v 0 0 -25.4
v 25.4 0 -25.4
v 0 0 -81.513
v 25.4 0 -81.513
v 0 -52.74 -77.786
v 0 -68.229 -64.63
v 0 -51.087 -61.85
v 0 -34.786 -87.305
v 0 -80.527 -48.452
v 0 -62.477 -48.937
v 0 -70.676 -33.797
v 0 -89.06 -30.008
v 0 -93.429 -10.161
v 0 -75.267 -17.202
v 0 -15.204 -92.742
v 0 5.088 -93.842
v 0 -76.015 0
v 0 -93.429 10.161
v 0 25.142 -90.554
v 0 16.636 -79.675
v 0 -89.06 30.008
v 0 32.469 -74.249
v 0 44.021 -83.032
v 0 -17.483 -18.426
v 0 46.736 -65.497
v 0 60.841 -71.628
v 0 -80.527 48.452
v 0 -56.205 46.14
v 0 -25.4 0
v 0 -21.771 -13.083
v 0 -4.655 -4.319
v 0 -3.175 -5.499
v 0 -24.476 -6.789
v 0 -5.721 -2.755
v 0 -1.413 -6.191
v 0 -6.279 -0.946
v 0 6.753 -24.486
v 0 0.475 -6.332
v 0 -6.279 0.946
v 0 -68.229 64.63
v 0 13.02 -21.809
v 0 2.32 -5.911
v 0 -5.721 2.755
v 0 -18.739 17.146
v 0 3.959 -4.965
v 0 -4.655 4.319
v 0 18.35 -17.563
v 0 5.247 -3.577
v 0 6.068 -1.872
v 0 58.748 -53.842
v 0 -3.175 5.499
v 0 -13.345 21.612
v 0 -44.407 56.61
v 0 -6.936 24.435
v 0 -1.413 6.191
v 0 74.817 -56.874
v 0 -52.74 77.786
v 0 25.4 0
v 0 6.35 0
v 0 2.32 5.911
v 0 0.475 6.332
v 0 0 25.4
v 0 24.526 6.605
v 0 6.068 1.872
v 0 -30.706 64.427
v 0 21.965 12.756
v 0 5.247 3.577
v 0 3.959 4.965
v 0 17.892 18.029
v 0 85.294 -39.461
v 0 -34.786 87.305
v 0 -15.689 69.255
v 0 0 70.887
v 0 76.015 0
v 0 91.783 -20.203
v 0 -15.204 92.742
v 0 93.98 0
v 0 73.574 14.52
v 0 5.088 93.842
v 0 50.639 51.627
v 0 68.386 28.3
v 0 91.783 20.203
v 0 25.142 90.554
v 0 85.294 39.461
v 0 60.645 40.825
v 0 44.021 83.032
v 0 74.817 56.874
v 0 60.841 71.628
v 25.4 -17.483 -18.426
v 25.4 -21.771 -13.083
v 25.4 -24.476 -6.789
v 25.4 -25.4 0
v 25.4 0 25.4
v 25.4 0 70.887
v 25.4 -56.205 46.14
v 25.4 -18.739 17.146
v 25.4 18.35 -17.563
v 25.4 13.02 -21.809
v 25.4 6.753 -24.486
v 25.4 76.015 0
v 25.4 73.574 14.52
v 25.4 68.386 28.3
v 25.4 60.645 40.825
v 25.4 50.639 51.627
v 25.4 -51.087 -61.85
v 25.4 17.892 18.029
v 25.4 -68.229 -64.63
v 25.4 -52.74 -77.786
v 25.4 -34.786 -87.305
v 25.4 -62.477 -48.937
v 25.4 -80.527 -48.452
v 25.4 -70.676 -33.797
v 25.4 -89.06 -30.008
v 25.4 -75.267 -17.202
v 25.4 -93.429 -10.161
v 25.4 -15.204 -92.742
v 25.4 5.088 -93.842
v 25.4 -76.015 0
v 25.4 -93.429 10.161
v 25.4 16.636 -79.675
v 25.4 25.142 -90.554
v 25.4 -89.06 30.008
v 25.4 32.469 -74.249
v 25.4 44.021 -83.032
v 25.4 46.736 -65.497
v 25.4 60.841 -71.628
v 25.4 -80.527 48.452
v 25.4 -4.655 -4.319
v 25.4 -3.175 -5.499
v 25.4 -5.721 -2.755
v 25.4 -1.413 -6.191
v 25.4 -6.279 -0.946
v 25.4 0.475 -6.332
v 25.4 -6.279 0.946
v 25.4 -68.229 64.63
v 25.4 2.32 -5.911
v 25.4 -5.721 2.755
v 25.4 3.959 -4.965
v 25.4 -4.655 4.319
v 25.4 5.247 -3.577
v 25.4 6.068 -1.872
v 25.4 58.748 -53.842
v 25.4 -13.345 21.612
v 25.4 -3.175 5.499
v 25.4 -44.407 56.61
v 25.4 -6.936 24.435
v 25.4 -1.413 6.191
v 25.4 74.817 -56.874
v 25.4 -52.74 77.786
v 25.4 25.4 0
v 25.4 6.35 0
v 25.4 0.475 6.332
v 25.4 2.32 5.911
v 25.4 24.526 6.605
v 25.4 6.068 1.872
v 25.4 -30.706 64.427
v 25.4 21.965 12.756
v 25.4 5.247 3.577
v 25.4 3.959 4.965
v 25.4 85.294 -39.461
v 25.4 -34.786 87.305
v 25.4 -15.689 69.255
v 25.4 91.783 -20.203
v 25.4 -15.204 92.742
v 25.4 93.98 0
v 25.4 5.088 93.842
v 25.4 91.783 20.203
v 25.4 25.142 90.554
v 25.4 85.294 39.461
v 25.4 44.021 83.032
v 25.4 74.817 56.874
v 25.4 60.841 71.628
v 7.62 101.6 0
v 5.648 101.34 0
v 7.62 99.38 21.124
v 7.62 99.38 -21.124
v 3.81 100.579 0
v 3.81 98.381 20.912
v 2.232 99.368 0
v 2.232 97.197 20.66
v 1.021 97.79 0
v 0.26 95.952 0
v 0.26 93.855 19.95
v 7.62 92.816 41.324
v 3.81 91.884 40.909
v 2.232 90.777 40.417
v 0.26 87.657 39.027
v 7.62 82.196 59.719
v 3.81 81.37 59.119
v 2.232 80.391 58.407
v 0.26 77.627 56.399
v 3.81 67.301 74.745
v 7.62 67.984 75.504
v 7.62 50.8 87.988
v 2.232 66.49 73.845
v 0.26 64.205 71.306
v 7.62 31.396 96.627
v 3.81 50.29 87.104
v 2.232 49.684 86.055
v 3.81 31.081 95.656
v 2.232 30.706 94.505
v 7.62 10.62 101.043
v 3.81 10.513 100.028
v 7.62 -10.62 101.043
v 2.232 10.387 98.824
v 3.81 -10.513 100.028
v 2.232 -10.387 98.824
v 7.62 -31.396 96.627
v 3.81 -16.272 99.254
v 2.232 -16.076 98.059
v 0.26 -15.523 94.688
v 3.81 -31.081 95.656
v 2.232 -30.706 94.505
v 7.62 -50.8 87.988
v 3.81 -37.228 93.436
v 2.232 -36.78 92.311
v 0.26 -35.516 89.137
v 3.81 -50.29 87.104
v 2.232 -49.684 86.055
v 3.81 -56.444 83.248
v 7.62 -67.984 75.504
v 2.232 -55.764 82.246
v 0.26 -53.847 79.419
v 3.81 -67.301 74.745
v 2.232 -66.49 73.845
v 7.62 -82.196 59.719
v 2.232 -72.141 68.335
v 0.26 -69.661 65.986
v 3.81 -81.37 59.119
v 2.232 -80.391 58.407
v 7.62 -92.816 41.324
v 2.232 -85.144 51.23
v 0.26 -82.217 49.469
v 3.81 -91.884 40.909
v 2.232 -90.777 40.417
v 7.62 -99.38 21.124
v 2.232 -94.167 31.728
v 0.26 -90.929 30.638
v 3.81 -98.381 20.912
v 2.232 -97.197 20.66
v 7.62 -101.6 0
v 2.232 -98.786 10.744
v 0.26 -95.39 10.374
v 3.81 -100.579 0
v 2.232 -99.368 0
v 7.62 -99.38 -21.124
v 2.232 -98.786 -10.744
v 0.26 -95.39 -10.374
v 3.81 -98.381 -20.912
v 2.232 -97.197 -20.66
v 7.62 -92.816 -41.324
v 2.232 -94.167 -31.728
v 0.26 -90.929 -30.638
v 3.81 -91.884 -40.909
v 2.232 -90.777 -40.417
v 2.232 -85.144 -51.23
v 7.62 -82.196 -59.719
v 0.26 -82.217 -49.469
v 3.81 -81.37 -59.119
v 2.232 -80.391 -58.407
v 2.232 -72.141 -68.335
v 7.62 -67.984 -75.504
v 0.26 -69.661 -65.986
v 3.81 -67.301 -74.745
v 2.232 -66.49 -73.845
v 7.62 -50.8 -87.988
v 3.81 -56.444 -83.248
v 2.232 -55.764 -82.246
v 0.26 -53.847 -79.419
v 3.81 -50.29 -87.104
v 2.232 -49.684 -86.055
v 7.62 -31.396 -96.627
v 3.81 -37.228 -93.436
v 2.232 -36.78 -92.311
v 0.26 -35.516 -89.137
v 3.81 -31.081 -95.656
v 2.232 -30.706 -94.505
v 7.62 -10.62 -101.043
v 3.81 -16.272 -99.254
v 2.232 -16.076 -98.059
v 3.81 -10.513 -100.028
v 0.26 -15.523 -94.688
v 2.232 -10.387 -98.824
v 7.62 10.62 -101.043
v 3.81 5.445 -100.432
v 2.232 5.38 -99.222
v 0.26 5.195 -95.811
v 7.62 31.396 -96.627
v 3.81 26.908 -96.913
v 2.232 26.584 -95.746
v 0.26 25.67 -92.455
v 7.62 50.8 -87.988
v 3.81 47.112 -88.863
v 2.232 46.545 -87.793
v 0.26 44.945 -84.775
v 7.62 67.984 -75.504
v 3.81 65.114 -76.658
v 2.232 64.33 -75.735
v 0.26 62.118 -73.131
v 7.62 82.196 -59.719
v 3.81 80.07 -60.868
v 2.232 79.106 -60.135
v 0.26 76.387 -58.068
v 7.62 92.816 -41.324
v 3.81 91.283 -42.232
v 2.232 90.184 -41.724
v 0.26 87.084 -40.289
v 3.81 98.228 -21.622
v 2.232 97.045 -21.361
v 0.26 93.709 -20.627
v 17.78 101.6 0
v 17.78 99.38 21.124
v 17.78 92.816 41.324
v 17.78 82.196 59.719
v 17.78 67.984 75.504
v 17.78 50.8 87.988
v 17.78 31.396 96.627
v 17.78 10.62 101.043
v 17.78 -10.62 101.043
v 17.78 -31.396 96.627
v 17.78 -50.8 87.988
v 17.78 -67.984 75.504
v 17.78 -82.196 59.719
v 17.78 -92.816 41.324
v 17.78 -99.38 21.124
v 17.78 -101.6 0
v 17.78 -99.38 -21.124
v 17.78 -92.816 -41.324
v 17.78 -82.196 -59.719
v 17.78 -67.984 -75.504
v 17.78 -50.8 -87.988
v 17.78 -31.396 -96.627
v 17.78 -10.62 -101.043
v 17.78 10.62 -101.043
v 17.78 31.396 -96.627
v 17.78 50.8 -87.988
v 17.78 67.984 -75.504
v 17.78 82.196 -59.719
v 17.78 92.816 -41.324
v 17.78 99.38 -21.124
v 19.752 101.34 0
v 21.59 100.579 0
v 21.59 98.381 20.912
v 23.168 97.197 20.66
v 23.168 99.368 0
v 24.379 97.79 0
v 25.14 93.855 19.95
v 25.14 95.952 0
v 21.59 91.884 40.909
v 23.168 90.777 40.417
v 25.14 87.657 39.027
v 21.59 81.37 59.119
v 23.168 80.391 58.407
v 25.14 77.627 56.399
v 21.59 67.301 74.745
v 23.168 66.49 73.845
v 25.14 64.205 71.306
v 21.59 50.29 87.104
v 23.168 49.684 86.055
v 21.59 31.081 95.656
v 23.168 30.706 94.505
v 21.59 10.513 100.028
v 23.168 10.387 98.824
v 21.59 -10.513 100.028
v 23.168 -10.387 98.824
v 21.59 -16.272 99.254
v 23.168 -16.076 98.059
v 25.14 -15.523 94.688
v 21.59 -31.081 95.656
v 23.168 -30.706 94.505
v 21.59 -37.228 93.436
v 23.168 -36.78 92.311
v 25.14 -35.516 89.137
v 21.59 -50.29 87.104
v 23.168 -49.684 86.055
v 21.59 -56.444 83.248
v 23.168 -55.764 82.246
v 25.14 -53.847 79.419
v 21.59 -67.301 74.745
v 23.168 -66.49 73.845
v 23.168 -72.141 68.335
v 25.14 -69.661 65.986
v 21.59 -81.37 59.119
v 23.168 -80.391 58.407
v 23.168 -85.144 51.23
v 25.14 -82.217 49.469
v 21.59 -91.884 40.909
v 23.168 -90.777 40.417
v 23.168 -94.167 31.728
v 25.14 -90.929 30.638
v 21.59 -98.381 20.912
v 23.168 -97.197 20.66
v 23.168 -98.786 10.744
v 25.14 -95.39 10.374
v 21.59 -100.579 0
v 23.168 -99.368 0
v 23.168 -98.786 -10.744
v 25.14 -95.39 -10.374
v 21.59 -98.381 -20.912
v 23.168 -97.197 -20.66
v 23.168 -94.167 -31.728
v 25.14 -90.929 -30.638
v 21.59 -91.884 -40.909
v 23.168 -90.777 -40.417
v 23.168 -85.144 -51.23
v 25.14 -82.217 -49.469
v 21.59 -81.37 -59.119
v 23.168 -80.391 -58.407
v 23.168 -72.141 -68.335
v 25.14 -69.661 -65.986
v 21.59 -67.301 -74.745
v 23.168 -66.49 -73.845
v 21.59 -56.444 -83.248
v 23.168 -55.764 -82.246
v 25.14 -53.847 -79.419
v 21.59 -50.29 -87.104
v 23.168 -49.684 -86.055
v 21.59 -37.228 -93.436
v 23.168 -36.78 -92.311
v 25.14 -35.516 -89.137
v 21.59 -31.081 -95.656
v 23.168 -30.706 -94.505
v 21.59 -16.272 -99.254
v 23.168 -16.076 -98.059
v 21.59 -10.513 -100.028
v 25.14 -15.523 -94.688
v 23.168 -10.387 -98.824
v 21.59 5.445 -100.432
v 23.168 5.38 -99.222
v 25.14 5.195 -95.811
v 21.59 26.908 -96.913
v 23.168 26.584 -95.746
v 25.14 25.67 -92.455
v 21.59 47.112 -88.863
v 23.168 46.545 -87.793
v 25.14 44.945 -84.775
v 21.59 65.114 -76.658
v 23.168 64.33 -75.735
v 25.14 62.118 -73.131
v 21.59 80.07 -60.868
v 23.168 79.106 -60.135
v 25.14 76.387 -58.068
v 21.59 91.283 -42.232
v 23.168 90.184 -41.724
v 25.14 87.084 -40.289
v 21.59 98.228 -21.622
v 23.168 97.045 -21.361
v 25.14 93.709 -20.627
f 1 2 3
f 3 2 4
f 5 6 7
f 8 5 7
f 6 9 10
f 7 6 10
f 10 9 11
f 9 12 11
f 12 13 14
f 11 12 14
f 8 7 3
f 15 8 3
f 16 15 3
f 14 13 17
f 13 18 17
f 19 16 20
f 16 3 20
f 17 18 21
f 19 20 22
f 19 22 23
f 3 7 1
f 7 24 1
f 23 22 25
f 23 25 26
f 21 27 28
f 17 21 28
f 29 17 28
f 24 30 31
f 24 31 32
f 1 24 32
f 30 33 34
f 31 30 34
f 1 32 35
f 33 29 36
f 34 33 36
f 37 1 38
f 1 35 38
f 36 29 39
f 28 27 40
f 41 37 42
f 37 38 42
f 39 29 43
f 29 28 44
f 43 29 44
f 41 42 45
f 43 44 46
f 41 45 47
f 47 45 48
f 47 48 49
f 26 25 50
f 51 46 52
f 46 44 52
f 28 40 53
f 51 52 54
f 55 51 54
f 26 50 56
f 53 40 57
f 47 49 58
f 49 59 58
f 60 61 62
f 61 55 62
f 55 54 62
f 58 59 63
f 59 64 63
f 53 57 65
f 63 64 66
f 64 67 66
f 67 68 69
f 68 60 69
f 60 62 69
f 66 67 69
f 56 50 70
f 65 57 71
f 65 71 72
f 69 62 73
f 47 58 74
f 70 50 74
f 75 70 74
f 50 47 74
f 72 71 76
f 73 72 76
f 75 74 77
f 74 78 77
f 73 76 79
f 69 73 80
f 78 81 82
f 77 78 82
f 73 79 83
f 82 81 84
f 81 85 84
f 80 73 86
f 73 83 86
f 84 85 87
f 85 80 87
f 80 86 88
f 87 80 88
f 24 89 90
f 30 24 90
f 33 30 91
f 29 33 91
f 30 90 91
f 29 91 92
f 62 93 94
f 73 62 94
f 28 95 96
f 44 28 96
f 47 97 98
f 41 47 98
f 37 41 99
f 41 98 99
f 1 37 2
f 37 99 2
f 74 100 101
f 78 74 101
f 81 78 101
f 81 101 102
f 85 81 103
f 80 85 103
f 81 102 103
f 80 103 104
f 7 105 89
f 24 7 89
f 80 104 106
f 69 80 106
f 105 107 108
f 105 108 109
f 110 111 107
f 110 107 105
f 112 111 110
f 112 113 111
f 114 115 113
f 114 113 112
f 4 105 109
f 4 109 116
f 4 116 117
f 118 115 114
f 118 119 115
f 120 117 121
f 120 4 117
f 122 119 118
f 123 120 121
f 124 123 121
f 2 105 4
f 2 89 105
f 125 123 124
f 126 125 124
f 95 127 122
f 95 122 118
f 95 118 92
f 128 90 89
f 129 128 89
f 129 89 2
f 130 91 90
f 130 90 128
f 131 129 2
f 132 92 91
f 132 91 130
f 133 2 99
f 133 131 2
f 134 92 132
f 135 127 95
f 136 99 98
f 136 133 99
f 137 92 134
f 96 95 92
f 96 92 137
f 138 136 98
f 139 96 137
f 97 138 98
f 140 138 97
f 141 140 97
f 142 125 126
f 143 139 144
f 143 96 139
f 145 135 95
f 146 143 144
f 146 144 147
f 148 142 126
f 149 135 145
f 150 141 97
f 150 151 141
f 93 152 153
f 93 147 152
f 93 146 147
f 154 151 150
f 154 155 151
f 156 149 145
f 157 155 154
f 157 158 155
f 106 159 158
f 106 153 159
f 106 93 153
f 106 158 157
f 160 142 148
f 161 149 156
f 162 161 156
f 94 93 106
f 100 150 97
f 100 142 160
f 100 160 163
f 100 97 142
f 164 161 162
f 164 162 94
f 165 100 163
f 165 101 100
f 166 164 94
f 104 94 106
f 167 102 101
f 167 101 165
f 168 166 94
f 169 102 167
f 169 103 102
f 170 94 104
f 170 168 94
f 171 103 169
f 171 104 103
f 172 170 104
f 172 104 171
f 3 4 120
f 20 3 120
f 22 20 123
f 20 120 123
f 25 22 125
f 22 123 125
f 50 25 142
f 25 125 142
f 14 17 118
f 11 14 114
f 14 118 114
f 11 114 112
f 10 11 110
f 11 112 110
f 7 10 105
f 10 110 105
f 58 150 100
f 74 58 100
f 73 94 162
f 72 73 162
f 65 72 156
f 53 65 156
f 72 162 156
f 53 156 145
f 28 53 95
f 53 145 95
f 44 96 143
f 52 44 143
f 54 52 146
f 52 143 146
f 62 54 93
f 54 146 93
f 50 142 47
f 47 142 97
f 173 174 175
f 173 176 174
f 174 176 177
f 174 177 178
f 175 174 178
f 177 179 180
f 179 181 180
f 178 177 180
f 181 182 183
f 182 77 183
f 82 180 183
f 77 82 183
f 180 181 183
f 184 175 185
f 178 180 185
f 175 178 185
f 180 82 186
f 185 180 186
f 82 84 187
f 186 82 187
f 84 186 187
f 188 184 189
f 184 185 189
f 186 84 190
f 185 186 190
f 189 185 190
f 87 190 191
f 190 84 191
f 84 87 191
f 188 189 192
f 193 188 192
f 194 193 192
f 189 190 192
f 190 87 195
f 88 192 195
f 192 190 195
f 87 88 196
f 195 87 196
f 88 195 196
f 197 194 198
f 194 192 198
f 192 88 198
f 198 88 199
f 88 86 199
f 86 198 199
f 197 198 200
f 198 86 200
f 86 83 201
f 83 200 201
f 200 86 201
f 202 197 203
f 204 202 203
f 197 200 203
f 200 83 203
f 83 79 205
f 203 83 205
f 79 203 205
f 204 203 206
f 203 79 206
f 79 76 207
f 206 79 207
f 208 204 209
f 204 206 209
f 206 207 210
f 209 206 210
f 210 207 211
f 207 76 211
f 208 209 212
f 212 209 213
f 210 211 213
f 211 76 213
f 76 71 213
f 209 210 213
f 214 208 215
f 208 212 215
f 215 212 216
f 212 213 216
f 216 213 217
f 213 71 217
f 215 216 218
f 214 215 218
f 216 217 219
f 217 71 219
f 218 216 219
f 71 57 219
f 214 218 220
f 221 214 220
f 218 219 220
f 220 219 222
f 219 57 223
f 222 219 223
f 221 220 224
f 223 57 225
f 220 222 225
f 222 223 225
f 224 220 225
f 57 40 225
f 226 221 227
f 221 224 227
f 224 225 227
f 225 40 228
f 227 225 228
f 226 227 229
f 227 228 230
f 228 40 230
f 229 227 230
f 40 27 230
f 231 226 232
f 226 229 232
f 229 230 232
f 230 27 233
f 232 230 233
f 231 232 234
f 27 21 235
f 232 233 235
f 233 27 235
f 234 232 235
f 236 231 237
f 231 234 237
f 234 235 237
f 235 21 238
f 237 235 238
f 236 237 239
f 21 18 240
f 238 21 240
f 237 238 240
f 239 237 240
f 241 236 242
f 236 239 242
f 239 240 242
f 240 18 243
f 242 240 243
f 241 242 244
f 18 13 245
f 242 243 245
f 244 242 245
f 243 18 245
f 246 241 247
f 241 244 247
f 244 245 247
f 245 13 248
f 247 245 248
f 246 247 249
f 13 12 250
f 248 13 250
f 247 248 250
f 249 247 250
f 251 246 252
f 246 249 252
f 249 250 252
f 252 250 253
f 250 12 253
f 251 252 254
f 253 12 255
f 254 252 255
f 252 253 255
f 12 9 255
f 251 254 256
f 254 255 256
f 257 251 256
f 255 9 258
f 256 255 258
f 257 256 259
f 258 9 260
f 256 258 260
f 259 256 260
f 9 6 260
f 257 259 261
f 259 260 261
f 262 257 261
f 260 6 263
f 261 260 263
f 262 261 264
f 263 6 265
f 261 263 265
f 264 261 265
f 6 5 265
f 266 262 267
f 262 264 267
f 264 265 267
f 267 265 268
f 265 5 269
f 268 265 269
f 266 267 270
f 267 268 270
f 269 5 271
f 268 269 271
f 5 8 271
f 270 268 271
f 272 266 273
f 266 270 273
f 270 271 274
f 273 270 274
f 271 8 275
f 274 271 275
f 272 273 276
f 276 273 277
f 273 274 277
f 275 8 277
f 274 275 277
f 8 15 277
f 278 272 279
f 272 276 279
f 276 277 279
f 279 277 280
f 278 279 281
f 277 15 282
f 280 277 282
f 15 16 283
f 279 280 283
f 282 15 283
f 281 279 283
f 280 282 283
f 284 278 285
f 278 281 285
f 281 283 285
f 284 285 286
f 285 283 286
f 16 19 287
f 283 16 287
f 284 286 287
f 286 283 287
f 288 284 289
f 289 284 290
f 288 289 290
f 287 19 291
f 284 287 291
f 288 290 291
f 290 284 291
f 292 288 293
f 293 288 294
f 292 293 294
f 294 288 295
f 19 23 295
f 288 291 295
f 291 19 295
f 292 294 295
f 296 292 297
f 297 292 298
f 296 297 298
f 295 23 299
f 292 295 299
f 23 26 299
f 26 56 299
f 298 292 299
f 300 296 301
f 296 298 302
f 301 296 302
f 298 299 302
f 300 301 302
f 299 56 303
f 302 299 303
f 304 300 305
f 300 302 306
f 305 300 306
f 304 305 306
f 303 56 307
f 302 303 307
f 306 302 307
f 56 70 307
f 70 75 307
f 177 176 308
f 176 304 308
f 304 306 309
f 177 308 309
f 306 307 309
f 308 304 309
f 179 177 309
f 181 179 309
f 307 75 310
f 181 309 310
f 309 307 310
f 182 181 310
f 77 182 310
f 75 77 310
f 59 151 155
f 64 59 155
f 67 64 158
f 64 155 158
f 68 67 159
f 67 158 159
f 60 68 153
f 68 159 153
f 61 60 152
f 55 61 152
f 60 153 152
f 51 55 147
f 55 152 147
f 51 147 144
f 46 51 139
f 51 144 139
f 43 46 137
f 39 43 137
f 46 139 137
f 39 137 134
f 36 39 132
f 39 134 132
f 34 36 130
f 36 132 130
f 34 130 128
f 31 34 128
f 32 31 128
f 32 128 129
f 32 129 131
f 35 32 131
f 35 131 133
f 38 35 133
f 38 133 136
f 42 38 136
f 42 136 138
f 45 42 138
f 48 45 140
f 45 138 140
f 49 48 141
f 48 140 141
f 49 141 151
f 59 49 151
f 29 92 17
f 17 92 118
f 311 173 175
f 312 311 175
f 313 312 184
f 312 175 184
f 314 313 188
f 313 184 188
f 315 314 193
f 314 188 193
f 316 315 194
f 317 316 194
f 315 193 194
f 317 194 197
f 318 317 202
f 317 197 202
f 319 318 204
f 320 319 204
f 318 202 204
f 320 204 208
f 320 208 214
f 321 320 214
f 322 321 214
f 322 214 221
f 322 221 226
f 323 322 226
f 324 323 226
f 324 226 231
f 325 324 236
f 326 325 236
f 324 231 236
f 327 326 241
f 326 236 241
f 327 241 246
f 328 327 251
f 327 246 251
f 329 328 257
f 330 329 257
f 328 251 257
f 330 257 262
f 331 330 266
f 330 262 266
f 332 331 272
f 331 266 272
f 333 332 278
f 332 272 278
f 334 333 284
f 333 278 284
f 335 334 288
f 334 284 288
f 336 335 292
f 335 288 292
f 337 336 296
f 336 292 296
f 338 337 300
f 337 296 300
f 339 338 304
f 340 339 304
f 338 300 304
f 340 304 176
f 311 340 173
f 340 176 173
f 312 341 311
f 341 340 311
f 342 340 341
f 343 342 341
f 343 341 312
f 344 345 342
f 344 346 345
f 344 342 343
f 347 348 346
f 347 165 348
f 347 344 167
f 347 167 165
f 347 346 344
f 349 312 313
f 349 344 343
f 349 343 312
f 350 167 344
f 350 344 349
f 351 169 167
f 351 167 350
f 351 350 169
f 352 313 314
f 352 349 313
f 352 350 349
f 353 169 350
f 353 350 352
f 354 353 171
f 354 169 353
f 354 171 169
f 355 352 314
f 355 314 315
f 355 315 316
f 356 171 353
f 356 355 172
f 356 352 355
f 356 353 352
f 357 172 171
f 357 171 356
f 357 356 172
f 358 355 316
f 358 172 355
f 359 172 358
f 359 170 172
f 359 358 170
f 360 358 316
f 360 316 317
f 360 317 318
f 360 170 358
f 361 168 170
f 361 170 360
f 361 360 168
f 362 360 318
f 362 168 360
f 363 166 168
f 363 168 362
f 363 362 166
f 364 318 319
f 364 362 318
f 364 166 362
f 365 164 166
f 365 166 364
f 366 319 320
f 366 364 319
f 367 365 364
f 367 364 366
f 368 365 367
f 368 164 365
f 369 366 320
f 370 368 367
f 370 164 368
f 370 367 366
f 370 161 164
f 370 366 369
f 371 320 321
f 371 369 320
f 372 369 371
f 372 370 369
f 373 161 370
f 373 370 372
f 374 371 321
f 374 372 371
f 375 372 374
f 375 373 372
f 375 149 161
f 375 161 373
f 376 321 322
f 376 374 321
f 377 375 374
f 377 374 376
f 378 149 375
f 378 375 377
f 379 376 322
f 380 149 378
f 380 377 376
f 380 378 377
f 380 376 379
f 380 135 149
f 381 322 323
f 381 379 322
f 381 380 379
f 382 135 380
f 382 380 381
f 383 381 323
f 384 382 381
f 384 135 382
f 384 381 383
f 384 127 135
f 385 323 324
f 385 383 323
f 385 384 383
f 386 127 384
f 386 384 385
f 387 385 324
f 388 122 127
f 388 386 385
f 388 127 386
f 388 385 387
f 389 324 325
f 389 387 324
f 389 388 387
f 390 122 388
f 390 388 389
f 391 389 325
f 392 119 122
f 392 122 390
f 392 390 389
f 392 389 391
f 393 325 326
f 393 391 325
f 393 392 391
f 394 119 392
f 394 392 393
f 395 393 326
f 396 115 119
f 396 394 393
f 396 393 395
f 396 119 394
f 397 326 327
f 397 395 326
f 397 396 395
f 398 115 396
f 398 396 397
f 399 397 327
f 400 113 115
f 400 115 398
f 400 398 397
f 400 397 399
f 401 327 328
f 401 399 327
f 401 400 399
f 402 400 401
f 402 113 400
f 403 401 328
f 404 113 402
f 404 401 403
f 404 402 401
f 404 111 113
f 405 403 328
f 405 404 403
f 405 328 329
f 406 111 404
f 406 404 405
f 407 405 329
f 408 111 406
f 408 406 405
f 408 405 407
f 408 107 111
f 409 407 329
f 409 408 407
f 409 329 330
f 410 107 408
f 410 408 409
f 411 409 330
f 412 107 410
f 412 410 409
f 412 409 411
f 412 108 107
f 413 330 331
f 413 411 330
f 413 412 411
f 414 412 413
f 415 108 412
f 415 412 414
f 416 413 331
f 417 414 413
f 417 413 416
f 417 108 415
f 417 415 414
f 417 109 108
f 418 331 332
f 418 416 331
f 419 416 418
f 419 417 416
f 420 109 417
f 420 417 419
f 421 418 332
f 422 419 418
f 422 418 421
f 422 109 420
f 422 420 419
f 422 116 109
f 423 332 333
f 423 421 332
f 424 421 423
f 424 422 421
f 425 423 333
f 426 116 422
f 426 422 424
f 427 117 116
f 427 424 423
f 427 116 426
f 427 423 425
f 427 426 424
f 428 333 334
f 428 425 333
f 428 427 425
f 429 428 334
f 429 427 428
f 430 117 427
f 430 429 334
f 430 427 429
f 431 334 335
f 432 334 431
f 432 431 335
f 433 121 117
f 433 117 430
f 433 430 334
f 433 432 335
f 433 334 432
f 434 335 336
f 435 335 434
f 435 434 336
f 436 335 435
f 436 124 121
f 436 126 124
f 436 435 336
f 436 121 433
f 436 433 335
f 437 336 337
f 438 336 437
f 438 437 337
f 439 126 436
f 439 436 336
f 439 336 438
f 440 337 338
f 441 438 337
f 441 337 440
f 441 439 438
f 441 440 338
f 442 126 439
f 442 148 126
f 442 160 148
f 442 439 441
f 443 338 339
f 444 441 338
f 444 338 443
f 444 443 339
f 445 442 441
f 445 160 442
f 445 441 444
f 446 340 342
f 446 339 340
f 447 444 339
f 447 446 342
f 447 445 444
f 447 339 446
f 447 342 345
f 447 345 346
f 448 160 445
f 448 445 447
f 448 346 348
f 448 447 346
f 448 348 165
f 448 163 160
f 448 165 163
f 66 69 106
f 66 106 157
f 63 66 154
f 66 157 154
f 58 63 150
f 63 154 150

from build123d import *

# Parameters (mm, degrees)
F0_R     = 101.6
F1_DEPTH = 25.4
F3_DEPTH = 25.4
F4_R     = 7.62
F5_R     = 6.35
F6_DEPTH = 25.4


with BuildPart() as f1:
    # F0 (on Right) → F1 (new body)
    with BuildSketch(Plane.YZ):
        Circle(F0_R)
    extrude(amount=F1_DEPTH)

    # F2 (on face) → F3 (cut)
    with BuildSketch(Plane.YZ.offset(25.4)):
        with BuildLine():
            Line((-51.087433, -61.850464), (-17.482547, -18.426083))
            ThreePointArc((-17.482547, -18.426083), (-23.336845, -10.027545), (-25.4, 0))
            Line((-25.4, 0), (-76.01457, 0))
            ThreePointArc((-76.01457, 0), (-70.67602, -33.796775), (-51.087433, -61.850464))
        make_face()
        with BuildLine():
            Line((58.748065, -53.842163), (18.349848, -17.562547))
            ThreePointArc((18.349848, -17.562547), (9.976755, -23.358603), (0, -25.4))
            Line((0, -25.4), (0, -81.512741))
            ThreePointArc((0, -81.512741), (32.469201, -74.248878), (58.748065, -53.842163))
        make_face()
        with BuildLine():
            ThreePointArc((17.89198, 18.028784), (23.447988, 9.764828), (25.4, 0))
            Line((25.4, 0), (76.01457, 0))
            ThreePointArc((76.01457, 0), (68.385887, 28.299913), (50.639288, 51.626723))
            Line((50.639288, 51.626723), (17.89198, 18.028784))
        make_face()
        with BuildLine():
            ThreePointArc((-18.739308, 17.146379), (-10.238212, 23.245193), (0, 25.4))
            Line((0, 25.4), (0, 70.887259))
            ThreePointArc((0, 70.887259), (-30.706062, 64.426615), (-56.205274, 46.14022))
            Line((-56.205274, 46.14022), (-18.739308, 17.146379))
        make_face()
    extrude(amount=-F3_DEPTH, mode=Mode.SUBTRACT)

    # F4
    f4_edges = [f1.edges().sort_by_distance(p)[0] for p in [
        (25.4, -101.6, 0),
        (0, -101.6, 0),
    ]]
    fillet(f4_edges, radius=F4_R)

    # F5 (on face) → F6 (cut)
    with BuildSketch(Plane.YZ.offset(25.4)):
        Circle(F5_R)
    extrude(amount=-F6_DEPTH, mode=Mode.SUBTRACT)


solid = f1.part
